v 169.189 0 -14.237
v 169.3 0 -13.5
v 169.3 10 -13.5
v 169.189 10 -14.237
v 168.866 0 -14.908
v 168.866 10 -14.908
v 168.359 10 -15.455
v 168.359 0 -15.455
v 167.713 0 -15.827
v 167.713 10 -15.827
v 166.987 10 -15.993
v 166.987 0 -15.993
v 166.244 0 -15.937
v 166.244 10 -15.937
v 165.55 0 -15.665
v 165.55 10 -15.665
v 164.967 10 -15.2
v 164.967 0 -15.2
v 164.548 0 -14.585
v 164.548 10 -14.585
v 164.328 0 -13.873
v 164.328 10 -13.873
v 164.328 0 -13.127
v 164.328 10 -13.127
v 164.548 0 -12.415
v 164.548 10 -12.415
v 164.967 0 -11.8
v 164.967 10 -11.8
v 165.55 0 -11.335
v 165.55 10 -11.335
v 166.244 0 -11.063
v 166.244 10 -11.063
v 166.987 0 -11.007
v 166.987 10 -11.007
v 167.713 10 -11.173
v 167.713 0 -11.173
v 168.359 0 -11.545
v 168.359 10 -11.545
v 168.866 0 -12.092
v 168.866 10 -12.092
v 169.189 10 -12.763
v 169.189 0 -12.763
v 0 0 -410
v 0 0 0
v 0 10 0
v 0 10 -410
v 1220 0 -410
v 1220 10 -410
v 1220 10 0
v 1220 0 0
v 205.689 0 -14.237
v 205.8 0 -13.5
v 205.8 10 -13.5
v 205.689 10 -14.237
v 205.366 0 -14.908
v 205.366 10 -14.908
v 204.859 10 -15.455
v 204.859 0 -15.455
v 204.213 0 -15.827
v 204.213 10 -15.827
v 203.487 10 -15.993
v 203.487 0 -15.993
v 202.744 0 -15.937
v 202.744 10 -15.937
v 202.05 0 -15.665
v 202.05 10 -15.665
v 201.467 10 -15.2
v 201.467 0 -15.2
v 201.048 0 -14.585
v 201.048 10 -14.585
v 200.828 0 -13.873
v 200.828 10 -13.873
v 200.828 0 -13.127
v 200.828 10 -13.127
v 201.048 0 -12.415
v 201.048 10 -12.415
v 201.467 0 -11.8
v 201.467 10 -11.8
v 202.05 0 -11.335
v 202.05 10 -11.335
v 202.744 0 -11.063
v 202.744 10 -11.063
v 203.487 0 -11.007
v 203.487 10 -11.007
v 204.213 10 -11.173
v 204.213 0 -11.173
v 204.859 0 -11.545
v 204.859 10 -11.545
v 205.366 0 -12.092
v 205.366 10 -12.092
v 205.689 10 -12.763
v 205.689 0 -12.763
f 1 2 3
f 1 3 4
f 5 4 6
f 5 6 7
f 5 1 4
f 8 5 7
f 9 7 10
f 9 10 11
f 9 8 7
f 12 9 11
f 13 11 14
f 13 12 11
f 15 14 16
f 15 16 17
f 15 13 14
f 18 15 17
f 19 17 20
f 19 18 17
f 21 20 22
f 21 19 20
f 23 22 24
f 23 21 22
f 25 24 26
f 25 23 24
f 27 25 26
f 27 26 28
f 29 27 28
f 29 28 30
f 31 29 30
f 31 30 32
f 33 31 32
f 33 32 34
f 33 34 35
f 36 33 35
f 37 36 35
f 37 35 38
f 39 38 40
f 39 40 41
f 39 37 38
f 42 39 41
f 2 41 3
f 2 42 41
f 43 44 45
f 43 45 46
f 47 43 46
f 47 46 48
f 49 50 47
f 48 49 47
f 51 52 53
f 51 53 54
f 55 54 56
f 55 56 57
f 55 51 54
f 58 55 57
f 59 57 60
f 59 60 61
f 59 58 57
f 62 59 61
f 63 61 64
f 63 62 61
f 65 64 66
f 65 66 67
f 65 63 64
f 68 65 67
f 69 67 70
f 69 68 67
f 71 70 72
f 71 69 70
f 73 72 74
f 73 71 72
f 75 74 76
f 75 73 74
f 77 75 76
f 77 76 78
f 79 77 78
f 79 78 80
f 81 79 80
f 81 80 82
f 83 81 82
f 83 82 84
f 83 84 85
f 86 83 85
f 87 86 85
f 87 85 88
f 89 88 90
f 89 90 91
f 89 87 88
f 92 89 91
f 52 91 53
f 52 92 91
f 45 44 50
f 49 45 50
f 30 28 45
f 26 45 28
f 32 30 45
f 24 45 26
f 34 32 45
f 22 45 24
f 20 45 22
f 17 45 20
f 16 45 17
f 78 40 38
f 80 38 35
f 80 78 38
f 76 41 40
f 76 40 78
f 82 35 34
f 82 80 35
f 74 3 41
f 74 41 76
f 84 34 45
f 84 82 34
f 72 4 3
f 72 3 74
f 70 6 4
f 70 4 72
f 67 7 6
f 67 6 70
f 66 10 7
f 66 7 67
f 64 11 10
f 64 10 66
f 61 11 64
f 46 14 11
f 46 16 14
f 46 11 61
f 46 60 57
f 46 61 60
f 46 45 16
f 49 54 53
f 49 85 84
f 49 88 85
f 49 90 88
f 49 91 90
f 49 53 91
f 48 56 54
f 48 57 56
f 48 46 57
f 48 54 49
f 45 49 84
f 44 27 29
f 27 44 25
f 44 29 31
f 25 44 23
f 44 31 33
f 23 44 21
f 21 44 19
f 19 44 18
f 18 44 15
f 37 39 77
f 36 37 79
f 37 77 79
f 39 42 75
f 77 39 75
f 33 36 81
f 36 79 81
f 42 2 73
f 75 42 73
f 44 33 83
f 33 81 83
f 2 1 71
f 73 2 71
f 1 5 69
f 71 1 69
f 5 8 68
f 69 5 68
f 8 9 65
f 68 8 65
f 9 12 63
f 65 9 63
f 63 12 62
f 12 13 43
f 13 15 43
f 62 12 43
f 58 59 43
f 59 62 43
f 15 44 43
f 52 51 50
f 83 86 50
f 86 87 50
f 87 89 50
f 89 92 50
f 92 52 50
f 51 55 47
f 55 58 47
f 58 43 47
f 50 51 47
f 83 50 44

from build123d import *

# Parameters (mm, degrees)
SKETCH1_W           = 1220
SKETCH1_H           = 410
BOSS_EXTRUDE1_DEPTH = 10
SKETCH2_R           = 2.5
CUT_EXTRUDE1_DEPTH  = 10


with BuildPart() as part:
    # Sketch1 → Boss-Extrude1 (new body)
    with BuildSketch(Plane(origin=(0, 0, 0), x_dir=(1, 0, 0), z_dir=(0, 1, 0))):
        with Locations((610, 205)):
            Rectangle(SKETCH1_W, SKETCH1_H)
    extrude(amount=BOSS_EXTRUDE1_DEPTH)

    # Sketch2 → Cut-Extrude1 (cut)
    with BuildSketch(Plane(origin=(0, 0, 0), x_dir=(1, 0, 0), z_dir=(0, 1, 0))):
        with Locations((166.8, 13.5)):
            Circle(SKETCH2_R)
        with Locations((203.3, 13.5)):
            Circle(SKETCH2_R)
    extrude(amount=CUT_EXTRUDE1_DEPTH, mode=Mode.SUBTRACT)


solid = part.part
